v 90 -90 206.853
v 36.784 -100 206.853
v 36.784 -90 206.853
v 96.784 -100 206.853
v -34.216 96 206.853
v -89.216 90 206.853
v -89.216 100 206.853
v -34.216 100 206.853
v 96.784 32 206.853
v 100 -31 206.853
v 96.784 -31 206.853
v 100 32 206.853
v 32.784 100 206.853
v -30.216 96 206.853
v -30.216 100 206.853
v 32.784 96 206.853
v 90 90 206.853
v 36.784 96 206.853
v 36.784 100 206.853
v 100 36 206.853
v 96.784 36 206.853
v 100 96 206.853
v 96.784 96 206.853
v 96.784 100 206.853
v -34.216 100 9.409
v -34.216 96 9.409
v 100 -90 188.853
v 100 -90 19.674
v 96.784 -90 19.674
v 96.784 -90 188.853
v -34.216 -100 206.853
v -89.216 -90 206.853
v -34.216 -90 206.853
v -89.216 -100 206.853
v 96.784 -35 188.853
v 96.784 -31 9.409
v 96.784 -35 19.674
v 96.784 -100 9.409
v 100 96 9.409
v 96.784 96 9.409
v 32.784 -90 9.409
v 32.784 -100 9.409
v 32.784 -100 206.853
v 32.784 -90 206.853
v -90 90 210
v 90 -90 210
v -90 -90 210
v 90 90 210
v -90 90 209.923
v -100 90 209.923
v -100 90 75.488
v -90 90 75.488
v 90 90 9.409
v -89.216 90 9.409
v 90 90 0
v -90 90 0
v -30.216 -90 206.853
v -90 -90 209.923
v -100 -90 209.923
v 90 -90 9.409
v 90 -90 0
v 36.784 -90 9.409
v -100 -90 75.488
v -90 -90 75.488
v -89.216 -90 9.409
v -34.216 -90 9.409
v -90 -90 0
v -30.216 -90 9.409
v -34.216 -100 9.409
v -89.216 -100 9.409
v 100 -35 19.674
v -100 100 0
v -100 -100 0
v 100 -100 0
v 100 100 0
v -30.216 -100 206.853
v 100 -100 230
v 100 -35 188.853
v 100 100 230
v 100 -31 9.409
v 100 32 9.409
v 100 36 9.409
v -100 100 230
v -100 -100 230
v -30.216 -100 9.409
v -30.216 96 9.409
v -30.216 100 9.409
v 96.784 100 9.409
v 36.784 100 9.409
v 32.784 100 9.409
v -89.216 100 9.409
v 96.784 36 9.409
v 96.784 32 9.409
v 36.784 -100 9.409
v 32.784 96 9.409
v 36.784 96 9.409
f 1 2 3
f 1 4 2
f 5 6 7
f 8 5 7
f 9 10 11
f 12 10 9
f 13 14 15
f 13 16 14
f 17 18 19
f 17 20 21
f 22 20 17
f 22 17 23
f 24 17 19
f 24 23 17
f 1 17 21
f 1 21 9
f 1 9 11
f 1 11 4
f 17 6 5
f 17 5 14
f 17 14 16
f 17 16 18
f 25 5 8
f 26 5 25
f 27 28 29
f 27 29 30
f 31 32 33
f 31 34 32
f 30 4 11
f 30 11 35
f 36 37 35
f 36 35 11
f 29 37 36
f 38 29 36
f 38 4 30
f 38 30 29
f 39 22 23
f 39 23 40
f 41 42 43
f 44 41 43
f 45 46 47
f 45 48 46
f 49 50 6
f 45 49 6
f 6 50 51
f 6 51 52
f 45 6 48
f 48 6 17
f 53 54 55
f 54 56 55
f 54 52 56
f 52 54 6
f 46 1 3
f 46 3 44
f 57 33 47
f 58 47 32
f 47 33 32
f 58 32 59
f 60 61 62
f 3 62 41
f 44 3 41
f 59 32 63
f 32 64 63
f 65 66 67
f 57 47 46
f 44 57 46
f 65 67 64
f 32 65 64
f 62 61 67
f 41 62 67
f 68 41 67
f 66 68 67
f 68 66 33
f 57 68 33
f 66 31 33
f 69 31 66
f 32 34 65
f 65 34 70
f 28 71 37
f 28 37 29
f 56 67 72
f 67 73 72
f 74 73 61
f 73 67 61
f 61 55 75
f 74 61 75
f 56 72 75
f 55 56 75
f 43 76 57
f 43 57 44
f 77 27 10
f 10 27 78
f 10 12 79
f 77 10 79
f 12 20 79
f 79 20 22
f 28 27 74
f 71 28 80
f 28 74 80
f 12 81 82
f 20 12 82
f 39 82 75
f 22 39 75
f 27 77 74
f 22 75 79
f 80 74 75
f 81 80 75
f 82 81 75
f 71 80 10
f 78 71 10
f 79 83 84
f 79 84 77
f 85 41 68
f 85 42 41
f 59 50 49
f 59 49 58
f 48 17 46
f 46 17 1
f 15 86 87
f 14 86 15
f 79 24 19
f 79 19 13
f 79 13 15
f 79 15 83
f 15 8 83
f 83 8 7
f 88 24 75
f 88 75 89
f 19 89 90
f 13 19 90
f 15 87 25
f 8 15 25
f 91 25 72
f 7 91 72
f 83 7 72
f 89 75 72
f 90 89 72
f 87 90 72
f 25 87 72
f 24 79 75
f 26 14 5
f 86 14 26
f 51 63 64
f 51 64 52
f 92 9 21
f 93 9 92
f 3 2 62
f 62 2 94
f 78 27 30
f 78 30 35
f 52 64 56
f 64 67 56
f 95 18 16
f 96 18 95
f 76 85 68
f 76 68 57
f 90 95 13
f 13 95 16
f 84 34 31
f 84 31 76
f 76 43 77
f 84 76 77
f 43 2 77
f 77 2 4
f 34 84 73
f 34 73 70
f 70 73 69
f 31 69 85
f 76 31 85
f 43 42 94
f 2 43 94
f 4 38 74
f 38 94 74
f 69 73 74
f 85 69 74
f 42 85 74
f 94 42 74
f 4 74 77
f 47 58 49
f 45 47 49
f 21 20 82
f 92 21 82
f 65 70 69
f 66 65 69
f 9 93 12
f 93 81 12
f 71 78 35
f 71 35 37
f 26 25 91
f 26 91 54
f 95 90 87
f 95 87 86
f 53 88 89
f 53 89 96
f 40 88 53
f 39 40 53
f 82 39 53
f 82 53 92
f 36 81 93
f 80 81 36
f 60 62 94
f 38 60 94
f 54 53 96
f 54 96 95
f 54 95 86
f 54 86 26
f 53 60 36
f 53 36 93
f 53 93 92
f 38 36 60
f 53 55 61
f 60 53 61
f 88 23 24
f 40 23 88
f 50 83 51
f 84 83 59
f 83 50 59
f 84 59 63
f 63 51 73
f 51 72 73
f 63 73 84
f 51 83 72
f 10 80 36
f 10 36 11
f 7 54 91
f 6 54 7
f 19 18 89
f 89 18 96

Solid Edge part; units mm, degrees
sketch "Sketch1" plane through (0, 0, 0) normal (0, 0, 1) x (1, 0, 0)
  line L0 (100, -100) -> (100, 100)
  line L1 (100, 100) -> (-100, 100)
  line L2 (-100, 100) -> (-100, -100)
  line L3 (-100, -100) -> (100, -100)
extrude "Protrusion1" add sketch "Sketch1" along normal blind 230
sketch "Sketch2" plane through (0, 0, 0) normal (0, 0, -1) x (0, 1, 0)
  line L0 (-90, 90) -> (-90, -90)
  line L1 (-90, -90) -> (90, -90)
  line L2 (90, -90) -> (90, 90)
  line L3 (90, 90) -> (-90, 90)
extrude "ScavoEstrusione_1" cut sketch "Sketch2" against normal blind 210
sketch "Sketch3" plane through (-100, 0, 114.7797) normal (-1, 0, 0) x (0, -1, 0)
  line L0 (-90, 95.1431) -> (90, 95.1431)
  line L1 (90, 95.1431) -> (90, -39.2912)
  line L2 (90, -39.2912) -> (-90, -39.2912)
  line L3 (-90, -39.2912) -> (-90, 95.1431)
extrude "ScavoEstrusione_2" cut sketch "Sketch3" against normal blind 30
sketch "Sketch4" plane through (0, -100, 115) normal (0, -1, 0) x (1, 0, 0)
  line L0 (-34.2156, 73.853) -> (-34.2156, -95.3257)
  line L1 (-34.2156, -105.591) -> (-34.2156, -95.3257)
  line L2 (-89.2156, -105.591) -> (-34.2156, -105.591)
  line L3 (-89.2156, -95.3257) -> (-89.2156, -105.591)
  line L4 (-89.2156, -95.3257) -> (-89.2156, 73.853)
  line L5 (-89.2156, 73.853) -> (-89.2156, 91.853)
  line L6 (-89.2156, 91.853) -> (-34.2156, 91.853)
  line L7 (-34.2156, 91.853) -> (-34.2156, 73.853)
  line L8 (32.7844, -105.591) -> (32.7844, 91.853)
  line L9 (-30.2156, 91.853) -> (32.7844, 91.853)
  line L10 (-30.2156, 73.853) -> (-30.2156, 91.853)
  line L11 (-30.2156, -105.591) -> (-30.2156, 73.853)
  line L12 (19.3173, -105.591) -> (-30.2156, -105.591)
  line L13 (32.7844, -105.591) -> (19.3173, -105.591)
  line L14 (36.7844, 91.853) -> (96.7844, 91.853)
  line L15 (96.7844, 91.853) -> (96.7844, 73.853)
  line L16 (96.7844, 73.853) -> (96.7844, -105.591)
  line L17 (96.7844, -105.591) -> (36.7844, -105.591)
  line L18 (36.7844, 91.853) -> (36.7844, -105.591)
extrude "ScavoEstrusione_3" cut sketch "Sketch4" against normal blind 317.7816
sketch "Sketch5" plane through (100, 0, 115) normal (1, 0, 0) x (0, 1, 0)
  line L0 (-90, 73.853) -> (-35, 73.853)
  line L1 (-35, 73.853) -> (-35, -95.3257)
  line L2 (-35, -95.3257) -> (-90, -95.3257)
  line L3 (-90, -95.3257) -> (-90, 73.853)
  line L4 (-31, 91.853) -> (32, 91.853)
  line L5 (32, -105.591) -> (32, 91.853)
  line L6 (32, -105.591) -> (18.5329, -105.591)
  line L7 (18.5329, -105.591) -> (-31, -105.591)
  line L8 (-31, -105.591) -> (-31, 73.853)
  line L9 (-31, 73.853) -> (-31, 91.853)
  line L10 (36, 91.853) -> (36, -105.591)
  line L11 (96, -105.591) -> (36, -105.591)
  line L12 (96, 73.853) -> (96, -105.591)
  line L13 (96, 91.853) -> (96, 73.853)
  line L14 (36, 91.853) -> (96, 91.853)
extrude "ProtrusioneEstrusa_3" cut sketch "Sketch5" against normal blind 166.3749
